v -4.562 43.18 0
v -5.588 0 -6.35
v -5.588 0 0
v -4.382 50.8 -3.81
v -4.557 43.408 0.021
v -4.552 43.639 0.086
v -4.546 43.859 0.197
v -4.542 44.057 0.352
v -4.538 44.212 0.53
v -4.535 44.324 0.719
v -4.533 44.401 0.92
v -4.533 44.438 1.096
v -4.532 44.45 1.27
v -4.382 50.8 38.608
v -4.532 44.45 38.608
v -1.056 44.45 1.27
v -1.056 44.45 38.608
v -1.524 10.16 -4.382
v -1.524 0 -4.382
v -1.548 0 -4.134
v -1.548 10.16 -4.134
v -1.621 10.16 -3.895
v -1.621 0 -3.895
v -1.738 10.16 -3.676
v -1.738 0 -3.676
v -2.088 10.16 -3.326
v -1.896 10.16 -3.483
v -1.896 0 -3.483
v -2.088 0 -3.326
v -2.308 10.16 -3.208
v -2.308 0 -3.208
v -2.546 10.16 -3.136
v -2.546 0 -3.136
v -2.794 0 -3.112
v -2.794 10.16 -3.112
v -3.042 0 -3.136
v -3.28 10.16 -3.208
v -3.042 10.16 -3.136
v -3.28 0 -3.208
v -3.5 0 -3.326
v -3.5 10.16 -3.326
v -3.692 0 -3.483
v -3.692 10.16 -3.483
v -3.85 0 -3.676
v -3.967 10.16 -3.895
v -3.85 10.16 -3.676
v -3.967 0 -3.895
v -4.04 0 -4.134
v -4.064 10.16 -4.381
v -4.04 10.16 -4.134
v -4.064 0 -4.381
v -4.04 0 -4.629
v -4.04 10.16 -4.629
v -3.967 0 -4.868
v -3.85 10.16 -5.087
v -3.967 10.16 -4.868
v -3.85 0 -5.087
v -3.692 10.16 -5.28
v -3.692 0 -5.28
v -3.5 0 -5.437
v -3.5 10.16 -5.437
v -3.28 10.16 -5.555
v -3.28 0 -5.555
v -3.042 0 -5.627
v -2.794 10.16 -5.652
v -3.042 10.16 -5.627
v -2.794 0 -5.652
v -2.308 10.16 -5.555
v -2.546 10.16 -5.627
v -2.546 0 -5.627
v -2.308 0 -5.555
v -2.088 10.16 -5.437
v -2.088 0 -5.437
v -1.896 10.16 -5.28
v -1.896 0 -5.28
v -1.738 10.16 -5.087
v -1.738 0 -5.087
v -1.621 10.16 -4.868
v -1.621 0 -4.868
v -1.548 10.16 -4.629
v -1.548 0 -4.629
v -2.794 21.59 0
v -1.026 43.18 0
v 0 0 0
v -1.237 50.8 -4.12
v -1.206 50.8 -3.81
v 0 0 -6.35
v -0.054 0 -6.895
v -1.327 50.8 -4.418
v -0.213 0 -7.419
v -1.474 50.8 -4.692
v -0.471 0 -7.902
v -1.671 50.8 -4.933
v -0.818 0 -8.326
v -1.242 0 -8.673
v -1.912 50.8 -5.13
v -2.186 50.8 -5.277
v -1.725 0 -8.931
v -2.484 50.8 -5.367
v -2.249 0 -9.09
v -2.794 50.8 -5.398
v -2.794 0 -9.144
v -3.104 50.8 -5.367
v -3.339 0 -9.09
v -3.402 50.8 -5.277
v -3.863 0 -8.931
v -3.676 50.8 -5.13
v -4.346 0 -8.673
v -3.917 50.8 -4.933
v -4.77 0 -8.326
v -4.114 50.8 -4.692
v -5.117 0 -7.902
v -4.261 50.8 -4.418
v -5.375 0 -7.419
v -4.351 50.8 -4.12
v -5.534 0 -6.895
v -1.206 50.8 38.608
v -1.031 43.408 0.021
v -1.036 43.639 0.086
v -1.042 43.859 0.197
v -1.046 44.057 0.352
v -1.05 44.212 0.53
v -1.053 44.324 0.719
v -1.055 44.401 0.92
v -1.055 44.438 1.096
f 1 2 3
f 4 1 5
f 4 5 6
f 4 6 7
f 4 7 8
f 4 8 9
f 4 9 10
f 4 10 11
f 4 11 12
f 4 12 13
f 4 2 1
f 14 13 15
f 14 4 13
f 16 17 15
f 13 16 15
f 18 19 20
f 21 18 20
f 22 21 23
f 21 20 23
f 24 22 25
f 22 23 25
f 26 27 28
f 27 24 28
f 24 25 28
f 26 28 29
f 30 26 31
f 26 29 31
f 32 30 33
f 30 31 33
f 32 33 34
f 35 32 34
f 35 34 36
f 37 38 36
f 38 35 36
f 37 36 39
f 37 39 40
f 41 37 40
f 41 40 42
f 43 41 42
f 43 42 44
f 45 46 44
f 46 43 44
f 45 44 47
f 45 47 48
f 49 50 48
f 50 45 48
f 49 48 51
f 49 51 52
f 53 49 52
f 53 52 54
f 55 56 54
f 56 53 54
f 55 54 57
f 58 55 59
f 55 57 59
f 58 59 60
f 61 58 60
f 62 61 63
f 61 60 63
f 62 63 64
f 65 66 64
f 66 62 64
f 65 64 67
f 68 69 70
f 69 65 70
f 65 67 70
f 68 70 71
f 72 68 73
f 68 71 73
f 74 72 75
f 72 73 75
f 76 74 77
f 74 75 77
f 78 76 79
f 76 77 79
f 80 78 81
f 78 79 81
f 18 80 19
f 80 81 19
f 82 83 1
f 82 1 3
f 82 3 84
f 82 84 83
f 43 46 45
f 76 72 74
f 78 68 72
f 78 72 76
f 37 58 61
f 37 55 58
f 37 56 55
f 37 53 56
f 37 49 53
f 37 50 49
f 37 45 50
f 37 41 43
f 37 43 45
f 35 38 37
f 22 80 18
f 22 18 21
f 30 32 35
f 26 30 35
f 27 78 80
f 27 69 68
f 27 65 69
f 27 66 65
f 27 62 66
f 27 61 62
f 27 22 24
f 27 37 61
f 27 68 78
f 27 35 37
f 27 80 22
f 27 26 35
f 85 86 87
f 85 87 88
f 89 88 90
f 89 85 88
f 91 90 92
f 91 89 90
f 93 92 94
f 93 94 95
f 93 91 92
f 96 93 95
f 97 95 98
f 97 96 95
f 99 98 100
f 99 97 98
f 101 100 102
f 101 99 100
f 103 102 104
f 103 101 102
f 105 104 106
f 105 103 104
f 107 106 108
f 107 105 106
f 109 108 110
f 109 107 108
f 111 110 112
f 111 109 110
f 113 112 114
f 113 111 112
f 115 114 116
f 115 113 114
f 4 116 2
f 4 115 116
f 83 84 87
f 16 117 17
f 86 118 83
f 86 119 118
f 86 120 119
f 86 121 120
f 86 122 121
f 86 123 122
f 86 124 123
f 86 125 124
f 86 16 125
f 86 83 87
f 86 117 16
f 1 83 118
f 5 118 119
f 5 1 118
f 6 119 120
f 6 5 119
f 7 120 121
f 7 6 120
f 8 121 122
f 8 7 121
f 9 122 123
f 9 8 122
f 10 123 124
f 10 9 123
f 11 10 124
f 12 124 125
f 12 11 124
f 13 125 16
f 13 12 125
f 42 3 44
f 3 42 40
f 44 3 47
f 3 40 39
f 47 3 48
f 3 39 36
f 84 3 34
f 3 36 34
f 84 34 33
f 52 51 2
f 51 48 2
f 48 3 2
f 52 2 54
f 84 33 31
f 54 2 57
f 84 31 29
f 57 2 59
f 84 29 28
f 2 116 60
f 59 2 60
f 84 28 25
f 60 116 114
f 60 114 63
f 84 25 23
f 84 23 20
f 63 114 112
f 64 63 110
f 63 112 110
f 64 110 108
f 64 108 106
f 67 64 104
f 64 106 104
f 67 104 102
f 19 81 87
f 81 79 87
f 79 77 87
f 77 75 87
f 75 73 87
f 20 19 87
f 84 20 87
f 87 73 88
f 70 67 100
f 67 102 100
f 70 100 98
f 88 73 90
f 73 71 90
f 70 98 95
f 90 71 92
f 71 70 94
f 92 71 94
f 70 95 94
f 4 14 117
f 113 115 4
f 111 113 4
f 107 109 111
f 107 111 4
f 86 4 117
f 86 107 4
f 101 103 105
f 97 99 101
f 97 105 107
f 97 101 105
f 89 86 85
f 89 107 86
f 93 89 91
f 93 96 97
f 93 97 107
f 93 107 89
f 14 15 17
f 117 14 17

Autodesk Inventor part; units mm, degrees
ref_plane "YZ Plane" through (0, 0, 0) normal (1, 0, 0) x (0, 1, 0)
ref_plane "XY Plane" through (0, 0, 0) normal (0, 0, 1) x (1, 0, 0)
sketch "Sketch6" plane through (0, 0, 0) normal (0, 1, 0) x (-1, 0, 0)
  line L0 (0, 0) -> (5.588, 0)
  line L1 (5.588, 0) -> (5.588, -6.35)
  line L2 (5.588, -6.35) -> (0, -6.35)
  line L3 (0, -6.35) -> (0, 0)
  arc A0 (0, -6.35) -> (5.588, -6.35) centre (2.794, -6.35) ccw
  dimension "d25" = 5.588
  dimension "d26" = 6.35
ref_plane "Work Plane1" through (0, 50.8, 0) normal (0, 1, 0) x (-1, 0, 0)
sketch "Sketch8" plane through (0, 50.8, 0) normal (0, 1, 0) x (-1, 0, 0)
  line L0 (4.3815, 0) -> (1.2065, 0)
  line L1 (1.2065, 0) -> (1.2065, -3.81)
  line L2 (1.2065, -3.81) -> (4.3815, -3.81)
  line L3 (4.3815, -3.81) -> (4.3815, 0)
  arc A0 (1.2065, -3.81) -> (4.3815, -3.81) centre (2.794, -3.81) ccw
  point P0 (0, 0)
  dimension "d27" = 3.175
  dimension "d28" = 3.81
  dimension "d49" = 1.2065
loft "Loft1" add profiles "Sketch6", "Sketch8"
sketch "Sketch9" plane through (-5.588, 0, 0) normal (0, 0, 1) x (1, 0, 0)
  line L0 (0, 0) -> (5.588, 0) projected
  line L1 (5.588, 0) -> (4.3815, 50.8) projected
  line L2 (1.2065, 50.8) -> (4.3815, 50.8) projected
  line L3 (0, 0) -> (1.2065, 50.8) projected
  line L4 (4.3815, 50.8) -> (5.588, 0) projected
  line L5 (4.5323, 44.45) -> (1.0557, 44.45)
  line L6 (0, 0) -> (1.2065, 50.8) projected
  dimension "d34" = 6.35
extrude "Extrusion5" add sketch "Sketch9" along normal blind 38.608 contours L3 L2 L1 L5
sketch "Sketch12" plane through (-2.794, 0, -6.35) normal (0, -1, 0) x (1, 0, 0)
  circle A0 centre (0, 1.9685) radius 1.27
  arc A1 (-2.794, 0) -> (2.794, 0) centre (0, 0) ccw projected
  line L0 (0, -2.794) -> (0, 1.9685)
  point P0 (2.794, 6.35)
  dimension "d44" = 2.54
  dimension "d46" = 4.7625
extrude "Extrusion8" cut sketch "Sketch12" against normal blind 10.16
fillet "Fillet3" radius 1.27 1 edges at (-2.794, 44.45, 0)
properties part number "RudderStabilizingFins"
